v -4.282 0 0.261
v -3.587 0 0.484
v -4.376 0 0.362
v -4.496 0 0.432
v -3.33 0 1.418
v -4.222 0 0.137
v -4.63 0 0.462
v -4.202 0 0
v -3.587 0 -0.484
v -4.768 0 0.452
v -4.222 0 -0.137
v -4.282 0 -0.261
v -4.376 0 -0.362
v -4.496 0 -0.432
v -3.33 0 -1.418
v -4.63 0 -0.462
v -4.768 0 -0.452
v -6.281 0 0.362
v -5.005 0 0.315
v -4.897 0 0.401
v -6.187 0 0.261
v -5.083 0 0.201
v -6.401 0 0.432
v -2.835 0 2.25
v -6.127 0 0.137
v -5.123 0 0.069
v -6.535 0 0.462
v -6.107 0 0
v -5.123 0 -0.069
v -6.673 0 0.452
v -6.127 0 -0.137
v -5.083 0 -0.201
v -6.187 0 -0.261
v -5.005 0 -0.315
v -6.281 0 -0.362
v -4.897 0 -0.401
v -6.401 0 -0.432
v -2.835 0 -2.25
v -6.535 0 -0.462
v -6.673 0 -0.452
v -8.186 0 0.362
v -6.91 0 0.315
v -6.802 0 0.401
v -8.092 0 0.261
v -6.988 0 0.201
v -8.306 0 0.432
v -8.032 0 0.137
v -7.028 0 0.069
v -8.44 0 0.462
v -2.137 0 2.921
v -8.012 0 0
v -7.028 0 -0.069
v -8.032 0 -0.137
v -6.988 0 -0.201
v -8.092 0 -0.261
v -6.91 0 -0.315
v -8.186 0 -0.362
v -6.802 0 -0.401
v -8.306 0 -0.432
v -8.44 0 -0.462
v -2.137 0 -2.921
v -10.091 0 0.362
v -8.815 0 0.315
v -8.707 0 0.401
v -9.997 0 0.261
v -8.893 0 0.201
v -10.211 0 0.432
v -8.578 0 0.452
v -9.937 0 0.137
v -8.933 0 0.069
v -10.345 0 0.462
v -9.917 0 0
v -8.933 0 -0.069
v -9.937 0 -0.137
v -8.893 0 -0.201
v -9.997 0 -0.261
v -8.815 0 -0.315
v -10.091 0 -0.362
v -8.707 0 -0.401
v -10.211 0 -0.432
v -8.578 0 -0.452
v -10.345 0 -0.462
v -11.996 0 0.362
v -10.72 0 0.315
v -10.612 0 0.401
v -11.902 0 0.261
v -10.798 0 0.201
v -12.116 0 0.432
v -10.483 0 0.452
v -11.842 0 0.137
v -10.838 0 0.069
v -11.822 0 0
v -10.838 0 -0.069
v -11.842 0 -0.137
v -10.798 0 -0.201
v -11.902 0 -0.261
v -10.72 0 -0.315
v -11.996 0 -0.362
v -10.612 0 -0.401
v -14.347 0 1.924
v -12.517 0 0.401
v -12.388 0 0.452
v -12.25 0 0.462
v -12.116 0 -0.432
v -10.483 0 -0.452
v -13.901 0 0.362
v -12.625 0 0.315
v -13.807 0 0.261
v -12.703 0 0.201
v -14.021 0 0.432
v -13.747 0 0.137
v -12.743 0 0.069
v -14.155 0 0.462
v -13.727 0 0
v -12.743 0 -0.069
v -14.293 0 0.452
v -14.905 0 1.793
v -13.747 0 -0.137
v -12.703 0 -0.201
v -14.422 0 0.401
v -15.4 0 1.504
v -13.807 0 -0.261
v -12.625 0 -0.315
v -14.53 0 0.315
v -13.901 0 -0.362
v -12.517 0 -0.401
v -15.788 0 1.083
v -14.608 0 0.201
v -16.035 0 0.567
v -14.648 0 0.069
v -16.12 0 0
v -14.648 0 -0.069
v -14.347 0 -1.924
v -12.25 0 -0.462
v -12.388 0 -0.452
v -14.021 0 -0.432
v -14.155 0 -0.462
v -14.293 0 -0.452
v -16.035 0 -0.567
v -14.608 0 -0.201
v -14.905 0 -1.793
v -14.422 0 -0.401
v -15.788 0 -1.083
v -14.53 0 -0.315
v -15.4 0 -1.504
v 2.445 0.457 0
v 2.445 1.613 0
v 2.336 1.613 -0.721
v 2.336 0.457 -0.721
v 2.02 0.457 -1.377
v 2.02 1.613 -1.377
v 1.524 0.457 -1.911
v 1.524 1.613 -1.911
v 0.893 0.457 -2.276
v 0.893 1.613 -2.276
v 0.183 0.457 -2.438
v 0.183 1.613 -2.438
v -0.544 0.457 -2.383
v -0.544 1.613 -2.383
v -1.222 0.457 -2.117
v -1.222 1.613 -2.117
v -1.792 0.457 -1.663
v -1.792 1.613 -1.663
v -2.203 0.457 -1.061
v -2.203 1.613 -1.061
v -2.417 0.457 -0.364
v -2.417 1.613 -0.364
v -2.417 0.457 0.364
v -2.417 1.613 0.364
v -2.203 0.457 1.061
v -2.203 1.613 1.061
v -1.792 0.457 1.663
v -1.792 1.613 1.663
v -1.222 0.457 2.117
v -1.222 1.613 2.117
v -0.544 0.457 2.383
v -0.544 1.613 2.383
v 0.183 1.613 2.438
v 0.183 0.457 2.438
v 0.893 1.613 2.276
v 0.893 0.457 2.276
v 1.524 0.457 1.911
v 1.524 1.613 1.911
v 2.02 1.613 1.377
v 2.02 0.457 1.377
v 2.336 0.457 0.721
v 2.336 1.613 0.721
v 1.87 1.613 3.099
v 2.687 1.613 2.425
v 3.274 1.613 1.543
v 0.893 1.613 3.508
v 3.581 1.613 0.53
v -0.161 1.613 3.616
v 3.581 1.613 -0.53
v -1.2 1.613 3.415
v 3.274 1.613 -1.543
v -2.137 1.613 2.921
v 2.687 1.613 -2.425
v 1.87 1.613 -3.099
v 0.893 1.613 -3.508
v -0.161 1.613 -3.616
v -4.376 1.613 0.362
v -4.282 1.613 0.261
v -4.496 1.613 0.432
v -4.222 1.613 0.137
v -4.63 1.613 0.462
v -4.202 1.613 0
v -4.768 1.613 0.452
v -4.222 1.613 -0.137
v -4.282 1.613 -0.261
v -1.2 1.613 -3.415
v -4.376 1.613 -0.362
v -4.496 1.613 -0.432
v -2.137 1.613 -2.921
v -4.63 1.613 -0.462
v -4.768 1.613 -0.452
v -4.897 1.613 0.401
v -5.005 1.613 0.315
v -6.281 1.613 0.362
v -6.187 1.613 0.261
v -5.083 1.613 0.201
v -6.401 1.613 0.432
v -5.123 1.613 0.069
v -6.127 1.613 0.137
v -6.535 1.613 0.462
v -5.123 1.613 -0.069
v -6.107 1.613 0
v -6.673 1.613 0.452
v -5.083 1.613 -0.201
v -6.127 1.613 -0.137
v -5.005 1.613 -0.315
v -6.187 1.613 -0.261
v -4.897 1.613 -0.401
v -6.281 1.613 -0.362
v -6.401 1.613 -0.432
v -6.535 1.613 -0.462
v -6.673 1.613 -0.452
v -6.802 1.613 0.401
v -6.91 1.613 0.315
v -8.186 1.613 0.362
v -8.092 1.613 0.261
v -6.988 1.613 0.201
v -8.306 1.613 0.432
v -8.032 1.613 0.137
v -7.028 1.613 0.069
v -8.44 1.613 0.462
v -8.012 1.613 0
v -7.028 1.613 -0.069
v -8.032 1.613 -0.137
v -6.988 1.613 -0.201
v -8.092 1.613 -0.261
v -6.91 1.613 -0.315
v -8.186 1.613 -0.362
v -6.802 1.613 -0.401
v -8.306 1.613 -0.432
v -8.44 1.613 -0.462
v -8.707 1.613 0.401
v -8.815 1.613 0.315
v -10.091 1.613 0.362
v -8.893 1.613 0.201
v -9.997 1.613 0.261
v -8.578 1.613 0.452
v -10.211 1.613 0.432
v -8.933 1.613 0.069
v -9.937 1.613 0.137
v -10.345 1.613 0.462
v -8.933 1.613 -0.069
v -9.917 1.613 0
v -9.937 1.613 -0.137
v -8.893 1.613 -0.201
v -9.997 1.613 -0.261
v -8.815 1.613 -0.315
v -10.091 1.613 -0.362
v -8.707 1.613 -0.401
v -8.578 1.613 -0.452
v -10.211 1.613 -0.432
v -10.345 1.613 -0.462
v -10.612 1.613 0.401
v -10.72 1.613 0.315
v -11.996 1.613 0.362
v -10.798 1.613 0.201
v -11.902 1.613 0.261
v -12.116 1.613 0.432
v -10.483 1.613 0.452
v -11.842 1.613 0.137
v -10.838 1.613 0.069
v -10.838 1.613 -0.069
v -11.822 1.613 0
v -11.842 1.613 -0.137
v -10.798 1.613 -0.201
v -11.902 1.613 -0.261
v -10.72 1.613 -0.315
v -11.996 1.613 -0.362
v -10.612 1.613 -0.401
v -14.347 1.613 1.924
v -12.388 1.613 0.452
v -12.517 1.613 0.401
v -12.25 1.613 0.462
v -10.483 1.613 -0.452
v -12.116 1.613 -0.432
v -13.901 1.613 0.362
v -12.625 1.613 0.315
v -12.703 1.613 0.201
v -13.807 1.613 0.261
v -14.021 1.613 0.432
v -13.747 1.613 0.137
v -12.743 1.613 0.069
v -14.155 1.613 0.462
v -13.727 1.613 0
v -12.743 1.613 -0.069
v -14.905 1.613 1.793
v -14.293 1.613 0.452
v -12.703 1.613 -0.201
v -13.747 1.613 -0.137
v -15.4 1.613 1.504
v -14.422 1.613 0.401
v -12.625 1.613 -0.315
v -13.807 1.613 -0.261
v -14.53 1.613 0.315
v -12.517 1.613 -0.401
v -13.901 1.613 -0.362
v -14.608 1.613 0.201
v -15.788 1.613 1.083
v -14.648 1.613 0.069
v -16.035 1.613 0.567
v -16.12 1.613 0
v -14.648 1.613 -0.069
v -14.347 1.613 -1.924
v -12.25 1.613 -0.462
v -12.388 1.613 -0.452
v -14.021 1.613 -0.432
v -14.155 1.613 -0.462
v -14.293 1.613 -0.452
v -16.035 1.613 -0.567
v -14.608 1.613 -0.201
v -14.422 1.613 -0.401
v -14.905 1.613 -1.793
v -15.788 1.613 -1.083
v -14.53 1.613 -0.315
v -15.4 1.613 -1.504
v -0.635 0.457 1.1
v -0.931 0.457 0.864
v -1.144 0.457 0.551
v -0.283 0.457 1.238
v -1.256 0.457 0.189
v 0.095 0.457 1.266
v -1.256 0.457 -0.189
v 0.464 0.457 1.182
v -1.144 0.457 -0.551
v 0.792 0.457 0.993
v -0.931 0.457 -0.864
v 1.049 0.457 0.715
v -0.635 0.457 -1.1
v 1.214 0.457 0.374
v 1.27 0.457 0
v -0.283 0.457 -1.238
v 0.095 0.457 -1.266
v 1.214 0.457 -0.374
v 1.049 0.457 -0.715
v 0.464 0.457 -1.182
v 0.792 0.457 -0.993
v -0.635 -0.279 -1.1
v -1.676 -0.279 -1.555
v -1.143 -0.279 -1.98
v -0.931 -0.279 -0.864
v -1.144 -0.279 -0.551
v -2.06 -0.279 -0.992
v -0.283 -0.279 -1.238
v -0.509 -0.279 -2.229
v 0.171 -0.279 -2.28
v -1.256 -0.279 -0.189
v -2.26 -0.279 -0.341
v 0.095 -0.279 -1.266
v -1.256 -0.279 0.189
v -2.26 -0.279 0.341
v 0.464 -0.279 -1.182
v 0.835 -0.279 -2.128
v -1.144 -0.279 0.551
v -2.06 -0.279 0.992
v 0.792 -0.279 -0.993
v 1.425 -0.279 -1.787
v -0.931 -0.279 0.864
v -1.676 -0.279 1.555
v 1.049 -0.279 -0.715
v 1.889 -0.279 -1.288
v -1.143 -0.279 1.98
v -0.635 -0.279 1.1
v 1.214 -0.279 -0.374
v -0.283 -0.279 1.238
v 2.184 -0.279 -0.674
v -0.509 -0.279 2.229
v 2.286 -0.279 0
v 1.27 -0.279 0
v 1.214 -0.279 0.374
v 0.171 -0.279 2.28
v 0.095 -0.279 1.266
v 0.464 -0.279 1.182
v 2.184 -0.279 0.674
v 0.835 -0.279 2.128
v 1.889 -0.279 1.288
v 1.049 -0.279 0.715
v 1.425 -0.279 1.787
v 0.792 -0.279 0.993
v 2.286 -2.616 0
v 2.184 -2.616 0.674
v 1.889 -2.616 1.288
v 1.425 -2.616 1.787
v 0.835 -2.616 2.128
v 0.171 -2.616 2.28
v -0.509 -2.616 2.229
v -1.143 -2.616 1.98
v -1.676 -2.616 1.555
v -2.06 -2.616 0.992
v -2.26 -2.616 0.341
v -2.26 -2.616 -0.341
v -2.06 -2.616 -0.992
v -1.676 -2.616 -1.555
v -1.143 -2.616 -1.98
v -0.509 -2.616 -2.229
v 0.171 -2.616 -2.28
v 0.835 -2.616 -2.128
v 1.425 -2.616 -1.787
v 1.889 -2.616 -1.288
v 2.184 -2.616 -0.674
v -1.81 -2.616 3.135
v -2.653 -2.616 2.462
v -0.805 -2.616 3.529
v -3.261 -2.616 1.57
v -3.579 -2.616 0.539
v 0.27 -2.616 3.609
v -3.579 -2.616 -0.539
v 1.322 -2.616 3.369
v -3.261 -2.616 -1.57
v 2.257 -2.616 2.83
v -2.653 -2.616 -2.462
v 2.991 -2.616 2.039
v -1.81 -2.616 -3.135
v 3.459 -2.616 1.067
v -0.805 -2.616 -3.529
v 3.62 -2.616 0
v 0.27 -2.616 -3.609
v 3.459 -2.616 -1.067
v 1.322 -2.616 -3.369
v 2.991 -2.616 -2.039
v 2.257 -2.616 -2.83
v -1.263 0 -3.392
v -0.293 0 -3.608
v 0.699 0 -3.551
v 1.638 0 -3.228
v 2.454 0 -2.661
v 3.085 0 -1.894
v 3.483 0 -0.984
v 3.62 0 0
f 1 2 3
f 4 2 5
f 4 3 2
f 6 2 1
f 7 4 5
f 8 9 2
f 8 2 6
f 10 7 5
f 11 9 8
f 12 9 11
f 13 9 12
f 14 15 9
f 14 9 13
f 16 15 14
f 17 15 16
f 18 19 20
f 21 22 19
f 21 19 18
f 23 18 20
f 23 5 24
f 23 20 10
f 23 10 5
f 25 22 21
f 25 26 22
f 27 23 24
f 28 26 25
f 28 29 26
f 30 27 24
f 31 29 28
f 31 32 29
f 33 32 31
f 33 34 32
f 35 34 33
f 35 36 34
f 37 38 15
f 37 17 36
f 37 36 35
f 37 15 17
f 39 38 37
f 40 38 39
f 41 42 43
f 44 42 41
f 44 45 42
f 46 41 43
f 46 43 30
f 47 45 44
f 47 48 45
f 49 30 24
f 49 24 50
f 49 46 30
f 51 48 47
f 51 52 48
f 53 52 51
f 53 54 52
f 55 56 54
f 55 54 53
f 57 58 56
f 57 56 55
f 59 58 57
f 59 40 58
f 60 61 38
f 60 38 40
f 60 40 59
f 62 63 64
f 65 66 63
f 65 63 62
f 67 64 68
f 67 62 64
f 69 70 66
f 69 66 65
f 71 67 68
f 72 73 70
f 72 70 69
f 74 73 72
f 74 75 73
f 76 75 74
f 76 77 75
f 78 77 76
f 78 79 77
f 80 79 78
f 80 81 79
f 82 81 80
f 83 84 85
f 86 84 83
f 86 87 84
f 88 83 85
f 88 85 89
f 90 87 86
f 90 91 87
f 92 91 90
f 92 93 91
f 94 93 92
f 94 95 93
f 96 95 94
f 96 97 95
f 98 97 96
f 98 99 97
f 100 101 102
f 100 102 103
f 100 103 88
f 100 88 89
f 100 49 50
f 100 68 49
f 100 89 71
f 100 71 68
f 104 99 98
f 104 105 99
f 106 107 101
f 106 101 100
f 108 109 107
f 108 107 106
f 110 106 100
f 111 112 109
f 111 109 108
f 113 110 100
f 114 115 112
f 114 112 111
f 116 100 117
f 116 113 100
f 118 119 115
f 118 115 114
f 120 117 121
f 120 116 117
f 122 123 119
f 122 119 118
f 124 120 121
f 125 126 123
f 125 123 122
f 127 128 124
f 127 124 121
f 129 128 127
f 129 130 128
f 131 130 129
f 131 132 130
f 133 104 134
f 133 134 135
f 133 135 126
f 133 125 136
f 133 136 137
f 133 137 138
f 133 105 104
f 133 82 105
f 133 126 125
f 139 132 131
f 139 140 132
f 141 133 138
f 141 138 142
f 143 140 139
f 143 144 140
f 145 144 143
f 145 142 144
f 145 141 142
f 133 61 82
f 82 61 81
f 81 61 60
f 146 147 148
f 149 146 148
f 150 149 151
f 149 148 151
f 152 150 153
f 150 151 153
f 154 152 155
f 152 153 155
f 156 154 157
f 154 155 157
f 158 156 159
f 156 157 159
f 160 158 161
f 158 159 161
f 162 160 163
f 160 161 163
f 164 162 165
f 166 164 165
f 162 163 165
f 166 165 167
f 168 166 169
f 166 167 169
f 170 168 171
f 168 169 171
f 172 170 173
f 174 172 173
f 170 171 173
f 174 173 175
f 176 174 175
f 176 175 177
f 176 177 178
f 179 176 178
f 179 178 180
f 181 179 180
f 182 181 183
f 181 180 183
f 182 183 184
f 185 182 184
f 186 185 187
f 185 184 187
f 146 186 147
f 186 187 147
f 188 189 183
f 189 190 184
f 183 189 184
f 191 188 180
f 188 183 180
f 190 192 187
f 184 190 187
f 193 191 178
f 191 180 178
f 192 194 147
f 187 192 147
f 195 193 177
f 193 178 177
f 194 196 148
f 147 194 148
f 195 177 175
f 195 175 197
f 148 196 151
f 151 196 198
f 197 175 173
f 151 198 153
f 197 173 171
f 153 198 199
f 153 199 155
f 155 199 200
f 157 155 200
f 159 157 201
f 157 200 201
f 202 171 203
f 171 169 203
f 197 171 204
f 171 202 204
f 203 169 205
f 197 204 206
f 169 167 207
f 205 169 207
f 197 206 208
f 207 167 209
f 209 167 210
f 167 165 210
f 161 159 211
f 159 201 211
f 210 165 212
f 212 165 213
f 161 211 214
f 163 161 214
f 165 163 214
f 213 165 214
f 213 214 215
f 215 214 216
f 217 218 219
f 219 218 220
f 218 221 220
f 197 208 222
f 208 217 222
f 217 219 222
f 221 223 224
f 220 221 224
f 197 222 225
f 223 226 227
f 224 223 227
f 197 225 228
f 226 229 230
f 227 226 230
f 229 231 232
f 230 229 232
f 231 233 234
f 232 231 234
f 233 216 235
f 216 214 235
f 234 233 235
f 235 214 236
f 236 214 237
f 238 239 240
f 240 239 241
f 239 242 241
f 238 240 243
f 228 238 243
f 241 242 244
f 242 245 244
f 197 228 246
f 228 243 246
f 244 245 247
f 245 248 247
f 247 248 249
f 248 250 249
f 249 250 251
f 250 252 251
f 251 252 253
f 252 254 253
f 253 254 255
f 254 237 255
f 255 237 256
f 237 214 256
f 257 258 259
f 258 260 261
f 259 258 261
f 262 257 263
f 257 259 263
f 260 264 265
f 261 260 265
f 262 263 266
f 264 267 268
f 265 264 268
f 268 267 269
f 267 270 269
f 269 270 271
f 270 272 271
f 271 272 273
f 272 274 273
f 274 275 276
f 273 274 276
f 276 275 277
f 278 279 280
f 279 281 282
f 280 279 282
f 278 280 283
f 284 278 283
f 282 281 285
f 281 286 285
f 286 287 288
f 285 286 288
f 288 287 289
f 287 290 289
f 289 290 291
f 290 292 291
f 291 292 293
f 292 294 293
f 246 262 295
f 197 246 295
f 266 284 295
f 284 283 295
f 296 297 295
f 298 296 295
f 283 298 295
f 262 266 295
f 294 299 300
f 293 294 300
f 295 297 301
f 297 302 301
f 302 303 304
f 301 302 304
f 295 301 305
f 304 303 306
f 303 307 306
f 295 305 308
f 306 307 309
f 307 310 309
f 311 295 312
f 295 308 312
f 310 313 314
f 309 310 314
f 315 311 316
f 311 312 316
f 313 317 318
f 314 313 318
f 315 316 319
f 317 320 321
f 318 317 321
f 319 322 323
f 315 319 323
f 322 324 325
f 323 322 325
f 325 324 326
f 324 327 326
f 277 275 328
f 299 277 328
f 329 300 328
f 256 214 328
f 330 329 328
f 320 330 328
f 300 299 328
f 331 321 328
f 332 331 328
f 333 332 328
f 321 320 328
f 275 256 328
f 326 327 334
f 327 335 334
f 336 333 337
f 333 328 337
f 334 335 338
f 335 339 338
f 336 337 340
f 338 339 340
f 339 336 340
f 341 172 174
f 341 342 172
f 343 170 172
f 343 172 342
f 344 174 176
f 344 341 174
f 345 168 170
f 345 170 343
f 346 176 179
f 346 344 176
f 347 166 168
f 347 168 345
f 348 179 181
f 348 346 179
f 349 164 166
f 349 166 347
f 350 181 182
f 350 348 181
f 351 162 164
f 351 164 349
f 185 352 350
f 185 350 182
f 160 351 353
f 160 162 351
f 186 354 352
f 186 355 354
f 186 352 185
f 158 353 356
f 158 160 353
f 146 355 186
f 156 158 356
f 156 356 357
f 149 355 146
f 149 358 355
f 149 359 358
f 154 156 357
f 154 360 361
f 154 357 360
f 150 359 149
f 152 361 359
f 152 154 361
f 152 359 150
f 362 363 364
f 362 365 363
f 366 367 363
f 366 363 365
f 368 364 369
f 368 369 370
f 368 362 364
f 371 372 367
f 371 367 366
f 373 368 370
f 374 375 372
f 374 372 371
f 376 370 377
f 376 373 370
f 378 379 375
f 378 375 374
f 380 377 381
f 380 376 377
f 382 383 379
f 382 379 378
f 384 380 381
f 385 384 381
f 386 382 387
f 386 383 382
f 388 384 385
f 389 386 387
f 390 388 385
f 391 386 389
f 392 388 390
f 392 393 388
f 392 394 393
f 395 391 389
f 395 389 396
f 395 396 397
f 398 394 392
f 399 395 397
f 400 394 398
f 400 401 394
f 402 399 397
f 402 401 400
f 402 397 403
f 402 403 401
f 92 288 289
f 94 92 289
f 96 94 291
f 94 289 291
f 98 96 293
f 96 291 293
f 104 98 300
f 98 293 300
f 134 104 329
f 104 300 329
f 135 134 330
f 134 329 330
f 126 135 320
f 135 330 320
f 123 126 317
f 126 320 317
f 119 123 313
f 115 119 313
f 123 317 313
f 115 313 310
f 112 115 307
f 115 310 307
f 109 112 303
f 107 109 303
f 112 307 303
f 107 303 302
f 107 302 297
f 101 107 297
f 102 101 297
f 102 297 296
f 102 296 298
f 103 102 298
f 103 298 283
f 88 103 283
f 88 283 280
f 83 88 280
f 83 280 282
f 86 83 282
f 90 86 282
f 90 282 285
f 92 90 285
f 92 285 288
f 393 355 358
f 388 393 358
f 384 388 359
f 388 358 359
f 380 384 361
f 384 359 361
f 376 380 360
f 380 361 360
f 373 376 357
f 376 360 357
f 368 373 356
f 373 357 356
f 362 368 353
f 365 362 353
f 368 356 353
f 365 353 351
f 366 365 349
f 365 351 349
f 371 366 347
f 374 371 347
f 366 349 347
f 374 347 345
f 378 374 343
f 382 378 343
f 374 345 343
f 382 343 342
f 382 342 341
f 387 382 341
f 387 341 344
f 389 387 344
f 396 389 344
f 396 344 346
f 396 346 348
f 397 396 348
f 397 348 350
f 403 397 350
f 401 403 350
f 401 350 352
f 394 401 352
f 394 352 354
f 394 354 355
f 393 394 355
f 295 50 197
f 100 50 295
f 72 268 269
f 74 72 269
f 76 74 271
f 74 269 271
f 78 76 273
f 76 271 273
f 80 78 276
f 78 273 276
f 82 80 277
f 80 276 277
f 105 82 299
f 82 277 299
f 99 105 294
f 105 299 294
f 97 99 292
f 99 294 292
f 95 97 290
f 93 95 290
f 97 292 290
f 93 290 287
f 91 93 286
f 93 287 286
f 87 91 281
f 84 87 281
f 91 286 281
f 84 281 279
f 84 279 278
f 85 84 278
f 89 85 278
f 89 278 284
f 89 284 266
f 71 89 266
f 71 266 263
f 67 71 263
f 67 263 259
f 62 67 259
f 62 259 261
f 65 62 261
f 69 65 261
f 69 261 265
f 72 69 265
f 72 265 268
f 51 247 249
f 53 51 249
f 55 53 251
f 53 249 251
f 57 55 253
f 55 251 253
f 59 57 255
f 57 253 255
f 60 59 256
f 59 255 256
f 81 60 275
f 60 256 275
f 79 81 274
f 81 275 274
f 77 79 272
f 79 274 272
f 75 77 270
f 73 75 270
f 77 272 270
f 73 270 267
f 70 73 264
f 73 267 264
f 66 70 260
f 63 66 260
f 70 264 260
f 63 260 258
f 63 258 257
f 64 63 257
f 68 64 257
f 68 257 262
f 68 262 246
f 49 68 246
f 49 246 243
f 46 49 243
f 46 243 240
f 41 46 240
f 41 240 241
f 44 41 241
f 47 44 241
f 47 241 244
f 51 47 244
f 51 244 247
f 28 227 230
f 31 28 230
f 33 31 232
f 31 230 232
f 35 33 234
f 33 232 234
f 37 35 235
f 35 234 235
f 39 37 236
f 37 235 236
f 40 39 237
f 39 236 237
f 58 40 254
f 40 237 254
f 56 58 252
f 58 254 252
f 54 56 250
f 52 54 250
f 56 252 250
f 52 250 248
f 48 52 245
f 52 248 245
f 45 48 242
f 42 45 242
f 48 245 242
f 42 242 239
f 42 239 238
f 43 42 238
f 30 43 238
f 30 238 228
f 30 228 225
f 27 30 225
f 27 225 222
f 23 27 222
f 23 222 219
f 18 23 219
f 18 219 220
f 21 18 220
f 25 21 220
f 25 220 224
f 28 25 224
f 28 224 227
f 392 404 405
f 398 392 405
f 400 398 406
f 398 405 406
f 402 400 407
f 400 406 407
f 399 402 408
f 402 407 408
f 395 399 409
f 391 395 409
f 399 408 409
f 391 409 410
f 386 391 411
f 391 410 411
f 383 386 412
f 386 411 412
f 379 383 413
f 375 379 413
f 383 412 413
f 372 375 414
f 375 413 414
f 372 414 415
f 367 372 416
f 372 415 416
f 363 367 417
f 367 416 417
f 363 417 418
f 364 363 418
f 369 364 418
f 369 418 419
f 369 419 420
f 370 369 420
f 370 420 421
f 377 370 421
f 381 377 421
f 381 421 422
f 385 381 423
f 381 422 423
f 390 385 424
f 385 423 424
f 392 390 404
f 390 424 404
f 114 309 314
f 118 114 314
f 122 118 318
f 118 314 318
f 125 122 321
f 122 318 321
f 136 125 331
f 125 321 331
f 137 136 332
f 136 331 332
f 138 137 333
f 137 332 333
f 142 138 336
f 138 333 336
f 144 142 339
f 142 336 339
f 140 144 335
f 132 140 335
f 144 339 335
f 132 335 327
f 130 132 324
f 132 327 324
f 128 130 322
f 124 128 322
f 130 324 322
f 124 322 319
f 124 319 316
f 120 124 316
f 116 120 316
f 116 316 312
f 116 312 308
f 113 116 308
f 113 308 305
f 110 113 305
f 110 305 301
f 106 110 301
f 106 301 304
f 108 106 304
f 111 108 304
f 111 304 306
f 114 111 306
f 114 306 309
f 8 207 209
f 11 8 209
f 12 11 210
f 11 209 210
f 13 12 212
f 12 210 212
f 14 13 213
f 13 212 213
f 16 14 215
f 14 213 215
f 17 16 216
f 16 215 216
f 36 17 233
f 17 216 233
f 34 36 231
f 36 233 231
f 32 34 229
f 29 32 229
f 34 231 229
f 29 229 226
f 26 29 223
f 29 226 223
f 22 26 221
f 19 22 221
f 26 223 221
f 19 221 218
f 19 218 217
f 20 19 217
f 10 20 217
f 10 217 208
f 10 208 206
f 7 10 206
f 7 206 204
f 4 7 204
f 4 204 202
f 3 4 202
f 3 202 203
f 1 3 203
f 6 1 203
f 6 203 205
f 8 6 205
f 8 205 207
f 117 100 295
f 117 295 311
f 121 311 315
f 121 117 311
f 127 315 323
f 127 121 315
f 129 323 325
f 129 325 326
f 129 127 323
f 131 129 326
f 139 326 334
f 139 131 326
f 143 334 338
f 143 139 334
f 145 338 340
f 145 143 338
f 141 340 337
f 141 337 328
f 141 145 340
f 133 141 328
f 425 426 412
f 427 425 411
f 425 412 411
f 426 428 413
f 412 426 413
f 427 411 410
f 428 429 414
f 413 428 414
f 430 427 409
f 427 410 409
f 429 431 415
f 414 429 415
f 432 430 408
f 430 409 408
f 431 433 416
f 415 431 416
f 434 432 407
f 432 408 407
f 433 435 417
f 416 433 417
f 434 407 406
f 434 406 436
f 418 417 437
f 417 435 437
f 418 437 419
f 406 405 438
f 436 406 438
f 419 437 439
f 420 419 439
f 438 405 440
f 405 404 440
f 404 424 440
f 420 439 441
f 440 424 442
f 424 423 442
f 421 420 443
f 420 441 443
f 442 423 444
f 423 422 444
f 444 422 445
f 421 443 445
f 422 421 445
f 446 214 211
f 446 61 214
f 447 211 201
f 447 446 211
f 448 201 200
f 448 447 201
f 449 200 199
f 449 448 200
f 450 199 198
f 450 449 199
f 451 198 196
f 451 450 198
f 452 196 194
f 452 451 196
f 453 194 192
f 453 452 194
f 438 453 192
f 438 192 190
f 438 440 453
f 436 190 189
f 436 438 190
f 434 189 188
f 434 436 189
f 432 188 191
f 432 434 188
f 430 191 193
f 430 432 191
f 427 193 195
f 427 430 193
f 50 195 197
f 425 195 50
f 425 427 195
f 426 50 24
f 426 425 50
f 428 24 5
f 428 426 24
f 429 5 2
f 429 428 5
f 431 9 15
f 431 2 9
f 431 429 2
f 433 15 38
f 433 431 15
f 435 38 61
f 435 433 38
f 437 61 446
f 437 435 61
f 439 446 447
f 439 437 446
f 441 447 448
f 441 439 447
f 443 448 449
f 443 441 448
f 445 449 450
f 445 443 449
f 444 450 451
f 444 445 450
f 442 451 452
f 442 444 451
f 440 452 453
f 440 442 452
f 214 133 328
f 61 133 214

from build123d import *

# Parameters (mm, degrees)
EXTRUDE17_DEPTH = 1.6129
SKETCH19_R      = 3.6195
EXTRUDE19_DEPTH = 4.2291
SKETCH20_R      = 0.46355
SKETCH20_R_2    = 1.27
EXTRUDE20_DEPTH = 5.2291
SKETCH21_R      = 2.44475
EXTRUDE21_DEPTH = 1.1557
SKETCH22_R      = 2.286
EXTRUDE22_DEPTH = 2.3368


with BuildPart() as part:
    # Sketch18 → Extrude17 (new body)
    with BuildSketch(Plane(origin=(0, 0, 0), x_dir=(1, 0, 0), z_dir=(0, 1, 0))):
        with BuildLine():
            Line((-14.347205988, 1.923996328), (-2.13741415, 2.921))
            ThreePointArc((-2.13741415, 2.921), (3.6195, 0), (-2.13741415, -2.921))
            Line((-2.13741415, -2.921), (-14.347205988, -1.923996328))
            ThreePointArc((-14.347205988, -1.923996328), (-16.1205, 0), (-14.347205988, 1.923996328))
        make_face()
    extrude(amount=EXTRUDE17_DEPTH)

    # Sketch19 → Extrude19 (add)
    with BuildSketch(Plane(origin=(0, 1.6129, 0), x_dir=(1, 0, 0), z_dir=(0, 1, 0))):
        Circle(SKETCH19_R)
    extrude(amount=-EXTRUDE19_DEPTH)

    # Sketch20 → Extrude20 (cut, through all)
    with BuildSketch(Plane(origin=(0, 1.6129, 0), x_dir=(1, 0, 0), z_dir=(0, 1, 0))):
        with Locations((-14.1901, 0)):
            Circle(SKETCH20_R)
        Circle(SKETCH20_R_2)
        with Locations((-4.6651, 0)):
            Circle(SKETCH20_R)
        with Locations((-6.5701, 0)):
            Circle(SKETCH20_R)
        with Locations((-8.4751, 0)):
            Circle(SKETCH20_R)
        with Locations((-10.3801, 0)):
            Circle(SKETCH20_R)
        with Locations((-12.2851, 0)):
            Circle(SKETCH20_R)
    extrude(amount=-EXTRUDE20_DEPTH, mode=Mode.SUBTRACT)

    # Sketch21 → Extrude21 (cut)
    with BuildSketch(Plane(origin=(0, 1.6129, 0), x_dir=(1, 0, 0), z_dir=(0, 1, 0))):
        Circle(SKETCH21_R)
    extrude(amount=-EXTRUDE21_DEPTH, mode=Mode.SUBTRACT)

    # Sketch22 → Extrude22 (cut)
    with BuildSketch(Plane.XZ.offset(2.6162)):
        Circle(SKETCH22_R)
    extrude(amount=-EXTRUDE22_DEPTH, mode=Mode.SUBTRACT)


solid = part.part
